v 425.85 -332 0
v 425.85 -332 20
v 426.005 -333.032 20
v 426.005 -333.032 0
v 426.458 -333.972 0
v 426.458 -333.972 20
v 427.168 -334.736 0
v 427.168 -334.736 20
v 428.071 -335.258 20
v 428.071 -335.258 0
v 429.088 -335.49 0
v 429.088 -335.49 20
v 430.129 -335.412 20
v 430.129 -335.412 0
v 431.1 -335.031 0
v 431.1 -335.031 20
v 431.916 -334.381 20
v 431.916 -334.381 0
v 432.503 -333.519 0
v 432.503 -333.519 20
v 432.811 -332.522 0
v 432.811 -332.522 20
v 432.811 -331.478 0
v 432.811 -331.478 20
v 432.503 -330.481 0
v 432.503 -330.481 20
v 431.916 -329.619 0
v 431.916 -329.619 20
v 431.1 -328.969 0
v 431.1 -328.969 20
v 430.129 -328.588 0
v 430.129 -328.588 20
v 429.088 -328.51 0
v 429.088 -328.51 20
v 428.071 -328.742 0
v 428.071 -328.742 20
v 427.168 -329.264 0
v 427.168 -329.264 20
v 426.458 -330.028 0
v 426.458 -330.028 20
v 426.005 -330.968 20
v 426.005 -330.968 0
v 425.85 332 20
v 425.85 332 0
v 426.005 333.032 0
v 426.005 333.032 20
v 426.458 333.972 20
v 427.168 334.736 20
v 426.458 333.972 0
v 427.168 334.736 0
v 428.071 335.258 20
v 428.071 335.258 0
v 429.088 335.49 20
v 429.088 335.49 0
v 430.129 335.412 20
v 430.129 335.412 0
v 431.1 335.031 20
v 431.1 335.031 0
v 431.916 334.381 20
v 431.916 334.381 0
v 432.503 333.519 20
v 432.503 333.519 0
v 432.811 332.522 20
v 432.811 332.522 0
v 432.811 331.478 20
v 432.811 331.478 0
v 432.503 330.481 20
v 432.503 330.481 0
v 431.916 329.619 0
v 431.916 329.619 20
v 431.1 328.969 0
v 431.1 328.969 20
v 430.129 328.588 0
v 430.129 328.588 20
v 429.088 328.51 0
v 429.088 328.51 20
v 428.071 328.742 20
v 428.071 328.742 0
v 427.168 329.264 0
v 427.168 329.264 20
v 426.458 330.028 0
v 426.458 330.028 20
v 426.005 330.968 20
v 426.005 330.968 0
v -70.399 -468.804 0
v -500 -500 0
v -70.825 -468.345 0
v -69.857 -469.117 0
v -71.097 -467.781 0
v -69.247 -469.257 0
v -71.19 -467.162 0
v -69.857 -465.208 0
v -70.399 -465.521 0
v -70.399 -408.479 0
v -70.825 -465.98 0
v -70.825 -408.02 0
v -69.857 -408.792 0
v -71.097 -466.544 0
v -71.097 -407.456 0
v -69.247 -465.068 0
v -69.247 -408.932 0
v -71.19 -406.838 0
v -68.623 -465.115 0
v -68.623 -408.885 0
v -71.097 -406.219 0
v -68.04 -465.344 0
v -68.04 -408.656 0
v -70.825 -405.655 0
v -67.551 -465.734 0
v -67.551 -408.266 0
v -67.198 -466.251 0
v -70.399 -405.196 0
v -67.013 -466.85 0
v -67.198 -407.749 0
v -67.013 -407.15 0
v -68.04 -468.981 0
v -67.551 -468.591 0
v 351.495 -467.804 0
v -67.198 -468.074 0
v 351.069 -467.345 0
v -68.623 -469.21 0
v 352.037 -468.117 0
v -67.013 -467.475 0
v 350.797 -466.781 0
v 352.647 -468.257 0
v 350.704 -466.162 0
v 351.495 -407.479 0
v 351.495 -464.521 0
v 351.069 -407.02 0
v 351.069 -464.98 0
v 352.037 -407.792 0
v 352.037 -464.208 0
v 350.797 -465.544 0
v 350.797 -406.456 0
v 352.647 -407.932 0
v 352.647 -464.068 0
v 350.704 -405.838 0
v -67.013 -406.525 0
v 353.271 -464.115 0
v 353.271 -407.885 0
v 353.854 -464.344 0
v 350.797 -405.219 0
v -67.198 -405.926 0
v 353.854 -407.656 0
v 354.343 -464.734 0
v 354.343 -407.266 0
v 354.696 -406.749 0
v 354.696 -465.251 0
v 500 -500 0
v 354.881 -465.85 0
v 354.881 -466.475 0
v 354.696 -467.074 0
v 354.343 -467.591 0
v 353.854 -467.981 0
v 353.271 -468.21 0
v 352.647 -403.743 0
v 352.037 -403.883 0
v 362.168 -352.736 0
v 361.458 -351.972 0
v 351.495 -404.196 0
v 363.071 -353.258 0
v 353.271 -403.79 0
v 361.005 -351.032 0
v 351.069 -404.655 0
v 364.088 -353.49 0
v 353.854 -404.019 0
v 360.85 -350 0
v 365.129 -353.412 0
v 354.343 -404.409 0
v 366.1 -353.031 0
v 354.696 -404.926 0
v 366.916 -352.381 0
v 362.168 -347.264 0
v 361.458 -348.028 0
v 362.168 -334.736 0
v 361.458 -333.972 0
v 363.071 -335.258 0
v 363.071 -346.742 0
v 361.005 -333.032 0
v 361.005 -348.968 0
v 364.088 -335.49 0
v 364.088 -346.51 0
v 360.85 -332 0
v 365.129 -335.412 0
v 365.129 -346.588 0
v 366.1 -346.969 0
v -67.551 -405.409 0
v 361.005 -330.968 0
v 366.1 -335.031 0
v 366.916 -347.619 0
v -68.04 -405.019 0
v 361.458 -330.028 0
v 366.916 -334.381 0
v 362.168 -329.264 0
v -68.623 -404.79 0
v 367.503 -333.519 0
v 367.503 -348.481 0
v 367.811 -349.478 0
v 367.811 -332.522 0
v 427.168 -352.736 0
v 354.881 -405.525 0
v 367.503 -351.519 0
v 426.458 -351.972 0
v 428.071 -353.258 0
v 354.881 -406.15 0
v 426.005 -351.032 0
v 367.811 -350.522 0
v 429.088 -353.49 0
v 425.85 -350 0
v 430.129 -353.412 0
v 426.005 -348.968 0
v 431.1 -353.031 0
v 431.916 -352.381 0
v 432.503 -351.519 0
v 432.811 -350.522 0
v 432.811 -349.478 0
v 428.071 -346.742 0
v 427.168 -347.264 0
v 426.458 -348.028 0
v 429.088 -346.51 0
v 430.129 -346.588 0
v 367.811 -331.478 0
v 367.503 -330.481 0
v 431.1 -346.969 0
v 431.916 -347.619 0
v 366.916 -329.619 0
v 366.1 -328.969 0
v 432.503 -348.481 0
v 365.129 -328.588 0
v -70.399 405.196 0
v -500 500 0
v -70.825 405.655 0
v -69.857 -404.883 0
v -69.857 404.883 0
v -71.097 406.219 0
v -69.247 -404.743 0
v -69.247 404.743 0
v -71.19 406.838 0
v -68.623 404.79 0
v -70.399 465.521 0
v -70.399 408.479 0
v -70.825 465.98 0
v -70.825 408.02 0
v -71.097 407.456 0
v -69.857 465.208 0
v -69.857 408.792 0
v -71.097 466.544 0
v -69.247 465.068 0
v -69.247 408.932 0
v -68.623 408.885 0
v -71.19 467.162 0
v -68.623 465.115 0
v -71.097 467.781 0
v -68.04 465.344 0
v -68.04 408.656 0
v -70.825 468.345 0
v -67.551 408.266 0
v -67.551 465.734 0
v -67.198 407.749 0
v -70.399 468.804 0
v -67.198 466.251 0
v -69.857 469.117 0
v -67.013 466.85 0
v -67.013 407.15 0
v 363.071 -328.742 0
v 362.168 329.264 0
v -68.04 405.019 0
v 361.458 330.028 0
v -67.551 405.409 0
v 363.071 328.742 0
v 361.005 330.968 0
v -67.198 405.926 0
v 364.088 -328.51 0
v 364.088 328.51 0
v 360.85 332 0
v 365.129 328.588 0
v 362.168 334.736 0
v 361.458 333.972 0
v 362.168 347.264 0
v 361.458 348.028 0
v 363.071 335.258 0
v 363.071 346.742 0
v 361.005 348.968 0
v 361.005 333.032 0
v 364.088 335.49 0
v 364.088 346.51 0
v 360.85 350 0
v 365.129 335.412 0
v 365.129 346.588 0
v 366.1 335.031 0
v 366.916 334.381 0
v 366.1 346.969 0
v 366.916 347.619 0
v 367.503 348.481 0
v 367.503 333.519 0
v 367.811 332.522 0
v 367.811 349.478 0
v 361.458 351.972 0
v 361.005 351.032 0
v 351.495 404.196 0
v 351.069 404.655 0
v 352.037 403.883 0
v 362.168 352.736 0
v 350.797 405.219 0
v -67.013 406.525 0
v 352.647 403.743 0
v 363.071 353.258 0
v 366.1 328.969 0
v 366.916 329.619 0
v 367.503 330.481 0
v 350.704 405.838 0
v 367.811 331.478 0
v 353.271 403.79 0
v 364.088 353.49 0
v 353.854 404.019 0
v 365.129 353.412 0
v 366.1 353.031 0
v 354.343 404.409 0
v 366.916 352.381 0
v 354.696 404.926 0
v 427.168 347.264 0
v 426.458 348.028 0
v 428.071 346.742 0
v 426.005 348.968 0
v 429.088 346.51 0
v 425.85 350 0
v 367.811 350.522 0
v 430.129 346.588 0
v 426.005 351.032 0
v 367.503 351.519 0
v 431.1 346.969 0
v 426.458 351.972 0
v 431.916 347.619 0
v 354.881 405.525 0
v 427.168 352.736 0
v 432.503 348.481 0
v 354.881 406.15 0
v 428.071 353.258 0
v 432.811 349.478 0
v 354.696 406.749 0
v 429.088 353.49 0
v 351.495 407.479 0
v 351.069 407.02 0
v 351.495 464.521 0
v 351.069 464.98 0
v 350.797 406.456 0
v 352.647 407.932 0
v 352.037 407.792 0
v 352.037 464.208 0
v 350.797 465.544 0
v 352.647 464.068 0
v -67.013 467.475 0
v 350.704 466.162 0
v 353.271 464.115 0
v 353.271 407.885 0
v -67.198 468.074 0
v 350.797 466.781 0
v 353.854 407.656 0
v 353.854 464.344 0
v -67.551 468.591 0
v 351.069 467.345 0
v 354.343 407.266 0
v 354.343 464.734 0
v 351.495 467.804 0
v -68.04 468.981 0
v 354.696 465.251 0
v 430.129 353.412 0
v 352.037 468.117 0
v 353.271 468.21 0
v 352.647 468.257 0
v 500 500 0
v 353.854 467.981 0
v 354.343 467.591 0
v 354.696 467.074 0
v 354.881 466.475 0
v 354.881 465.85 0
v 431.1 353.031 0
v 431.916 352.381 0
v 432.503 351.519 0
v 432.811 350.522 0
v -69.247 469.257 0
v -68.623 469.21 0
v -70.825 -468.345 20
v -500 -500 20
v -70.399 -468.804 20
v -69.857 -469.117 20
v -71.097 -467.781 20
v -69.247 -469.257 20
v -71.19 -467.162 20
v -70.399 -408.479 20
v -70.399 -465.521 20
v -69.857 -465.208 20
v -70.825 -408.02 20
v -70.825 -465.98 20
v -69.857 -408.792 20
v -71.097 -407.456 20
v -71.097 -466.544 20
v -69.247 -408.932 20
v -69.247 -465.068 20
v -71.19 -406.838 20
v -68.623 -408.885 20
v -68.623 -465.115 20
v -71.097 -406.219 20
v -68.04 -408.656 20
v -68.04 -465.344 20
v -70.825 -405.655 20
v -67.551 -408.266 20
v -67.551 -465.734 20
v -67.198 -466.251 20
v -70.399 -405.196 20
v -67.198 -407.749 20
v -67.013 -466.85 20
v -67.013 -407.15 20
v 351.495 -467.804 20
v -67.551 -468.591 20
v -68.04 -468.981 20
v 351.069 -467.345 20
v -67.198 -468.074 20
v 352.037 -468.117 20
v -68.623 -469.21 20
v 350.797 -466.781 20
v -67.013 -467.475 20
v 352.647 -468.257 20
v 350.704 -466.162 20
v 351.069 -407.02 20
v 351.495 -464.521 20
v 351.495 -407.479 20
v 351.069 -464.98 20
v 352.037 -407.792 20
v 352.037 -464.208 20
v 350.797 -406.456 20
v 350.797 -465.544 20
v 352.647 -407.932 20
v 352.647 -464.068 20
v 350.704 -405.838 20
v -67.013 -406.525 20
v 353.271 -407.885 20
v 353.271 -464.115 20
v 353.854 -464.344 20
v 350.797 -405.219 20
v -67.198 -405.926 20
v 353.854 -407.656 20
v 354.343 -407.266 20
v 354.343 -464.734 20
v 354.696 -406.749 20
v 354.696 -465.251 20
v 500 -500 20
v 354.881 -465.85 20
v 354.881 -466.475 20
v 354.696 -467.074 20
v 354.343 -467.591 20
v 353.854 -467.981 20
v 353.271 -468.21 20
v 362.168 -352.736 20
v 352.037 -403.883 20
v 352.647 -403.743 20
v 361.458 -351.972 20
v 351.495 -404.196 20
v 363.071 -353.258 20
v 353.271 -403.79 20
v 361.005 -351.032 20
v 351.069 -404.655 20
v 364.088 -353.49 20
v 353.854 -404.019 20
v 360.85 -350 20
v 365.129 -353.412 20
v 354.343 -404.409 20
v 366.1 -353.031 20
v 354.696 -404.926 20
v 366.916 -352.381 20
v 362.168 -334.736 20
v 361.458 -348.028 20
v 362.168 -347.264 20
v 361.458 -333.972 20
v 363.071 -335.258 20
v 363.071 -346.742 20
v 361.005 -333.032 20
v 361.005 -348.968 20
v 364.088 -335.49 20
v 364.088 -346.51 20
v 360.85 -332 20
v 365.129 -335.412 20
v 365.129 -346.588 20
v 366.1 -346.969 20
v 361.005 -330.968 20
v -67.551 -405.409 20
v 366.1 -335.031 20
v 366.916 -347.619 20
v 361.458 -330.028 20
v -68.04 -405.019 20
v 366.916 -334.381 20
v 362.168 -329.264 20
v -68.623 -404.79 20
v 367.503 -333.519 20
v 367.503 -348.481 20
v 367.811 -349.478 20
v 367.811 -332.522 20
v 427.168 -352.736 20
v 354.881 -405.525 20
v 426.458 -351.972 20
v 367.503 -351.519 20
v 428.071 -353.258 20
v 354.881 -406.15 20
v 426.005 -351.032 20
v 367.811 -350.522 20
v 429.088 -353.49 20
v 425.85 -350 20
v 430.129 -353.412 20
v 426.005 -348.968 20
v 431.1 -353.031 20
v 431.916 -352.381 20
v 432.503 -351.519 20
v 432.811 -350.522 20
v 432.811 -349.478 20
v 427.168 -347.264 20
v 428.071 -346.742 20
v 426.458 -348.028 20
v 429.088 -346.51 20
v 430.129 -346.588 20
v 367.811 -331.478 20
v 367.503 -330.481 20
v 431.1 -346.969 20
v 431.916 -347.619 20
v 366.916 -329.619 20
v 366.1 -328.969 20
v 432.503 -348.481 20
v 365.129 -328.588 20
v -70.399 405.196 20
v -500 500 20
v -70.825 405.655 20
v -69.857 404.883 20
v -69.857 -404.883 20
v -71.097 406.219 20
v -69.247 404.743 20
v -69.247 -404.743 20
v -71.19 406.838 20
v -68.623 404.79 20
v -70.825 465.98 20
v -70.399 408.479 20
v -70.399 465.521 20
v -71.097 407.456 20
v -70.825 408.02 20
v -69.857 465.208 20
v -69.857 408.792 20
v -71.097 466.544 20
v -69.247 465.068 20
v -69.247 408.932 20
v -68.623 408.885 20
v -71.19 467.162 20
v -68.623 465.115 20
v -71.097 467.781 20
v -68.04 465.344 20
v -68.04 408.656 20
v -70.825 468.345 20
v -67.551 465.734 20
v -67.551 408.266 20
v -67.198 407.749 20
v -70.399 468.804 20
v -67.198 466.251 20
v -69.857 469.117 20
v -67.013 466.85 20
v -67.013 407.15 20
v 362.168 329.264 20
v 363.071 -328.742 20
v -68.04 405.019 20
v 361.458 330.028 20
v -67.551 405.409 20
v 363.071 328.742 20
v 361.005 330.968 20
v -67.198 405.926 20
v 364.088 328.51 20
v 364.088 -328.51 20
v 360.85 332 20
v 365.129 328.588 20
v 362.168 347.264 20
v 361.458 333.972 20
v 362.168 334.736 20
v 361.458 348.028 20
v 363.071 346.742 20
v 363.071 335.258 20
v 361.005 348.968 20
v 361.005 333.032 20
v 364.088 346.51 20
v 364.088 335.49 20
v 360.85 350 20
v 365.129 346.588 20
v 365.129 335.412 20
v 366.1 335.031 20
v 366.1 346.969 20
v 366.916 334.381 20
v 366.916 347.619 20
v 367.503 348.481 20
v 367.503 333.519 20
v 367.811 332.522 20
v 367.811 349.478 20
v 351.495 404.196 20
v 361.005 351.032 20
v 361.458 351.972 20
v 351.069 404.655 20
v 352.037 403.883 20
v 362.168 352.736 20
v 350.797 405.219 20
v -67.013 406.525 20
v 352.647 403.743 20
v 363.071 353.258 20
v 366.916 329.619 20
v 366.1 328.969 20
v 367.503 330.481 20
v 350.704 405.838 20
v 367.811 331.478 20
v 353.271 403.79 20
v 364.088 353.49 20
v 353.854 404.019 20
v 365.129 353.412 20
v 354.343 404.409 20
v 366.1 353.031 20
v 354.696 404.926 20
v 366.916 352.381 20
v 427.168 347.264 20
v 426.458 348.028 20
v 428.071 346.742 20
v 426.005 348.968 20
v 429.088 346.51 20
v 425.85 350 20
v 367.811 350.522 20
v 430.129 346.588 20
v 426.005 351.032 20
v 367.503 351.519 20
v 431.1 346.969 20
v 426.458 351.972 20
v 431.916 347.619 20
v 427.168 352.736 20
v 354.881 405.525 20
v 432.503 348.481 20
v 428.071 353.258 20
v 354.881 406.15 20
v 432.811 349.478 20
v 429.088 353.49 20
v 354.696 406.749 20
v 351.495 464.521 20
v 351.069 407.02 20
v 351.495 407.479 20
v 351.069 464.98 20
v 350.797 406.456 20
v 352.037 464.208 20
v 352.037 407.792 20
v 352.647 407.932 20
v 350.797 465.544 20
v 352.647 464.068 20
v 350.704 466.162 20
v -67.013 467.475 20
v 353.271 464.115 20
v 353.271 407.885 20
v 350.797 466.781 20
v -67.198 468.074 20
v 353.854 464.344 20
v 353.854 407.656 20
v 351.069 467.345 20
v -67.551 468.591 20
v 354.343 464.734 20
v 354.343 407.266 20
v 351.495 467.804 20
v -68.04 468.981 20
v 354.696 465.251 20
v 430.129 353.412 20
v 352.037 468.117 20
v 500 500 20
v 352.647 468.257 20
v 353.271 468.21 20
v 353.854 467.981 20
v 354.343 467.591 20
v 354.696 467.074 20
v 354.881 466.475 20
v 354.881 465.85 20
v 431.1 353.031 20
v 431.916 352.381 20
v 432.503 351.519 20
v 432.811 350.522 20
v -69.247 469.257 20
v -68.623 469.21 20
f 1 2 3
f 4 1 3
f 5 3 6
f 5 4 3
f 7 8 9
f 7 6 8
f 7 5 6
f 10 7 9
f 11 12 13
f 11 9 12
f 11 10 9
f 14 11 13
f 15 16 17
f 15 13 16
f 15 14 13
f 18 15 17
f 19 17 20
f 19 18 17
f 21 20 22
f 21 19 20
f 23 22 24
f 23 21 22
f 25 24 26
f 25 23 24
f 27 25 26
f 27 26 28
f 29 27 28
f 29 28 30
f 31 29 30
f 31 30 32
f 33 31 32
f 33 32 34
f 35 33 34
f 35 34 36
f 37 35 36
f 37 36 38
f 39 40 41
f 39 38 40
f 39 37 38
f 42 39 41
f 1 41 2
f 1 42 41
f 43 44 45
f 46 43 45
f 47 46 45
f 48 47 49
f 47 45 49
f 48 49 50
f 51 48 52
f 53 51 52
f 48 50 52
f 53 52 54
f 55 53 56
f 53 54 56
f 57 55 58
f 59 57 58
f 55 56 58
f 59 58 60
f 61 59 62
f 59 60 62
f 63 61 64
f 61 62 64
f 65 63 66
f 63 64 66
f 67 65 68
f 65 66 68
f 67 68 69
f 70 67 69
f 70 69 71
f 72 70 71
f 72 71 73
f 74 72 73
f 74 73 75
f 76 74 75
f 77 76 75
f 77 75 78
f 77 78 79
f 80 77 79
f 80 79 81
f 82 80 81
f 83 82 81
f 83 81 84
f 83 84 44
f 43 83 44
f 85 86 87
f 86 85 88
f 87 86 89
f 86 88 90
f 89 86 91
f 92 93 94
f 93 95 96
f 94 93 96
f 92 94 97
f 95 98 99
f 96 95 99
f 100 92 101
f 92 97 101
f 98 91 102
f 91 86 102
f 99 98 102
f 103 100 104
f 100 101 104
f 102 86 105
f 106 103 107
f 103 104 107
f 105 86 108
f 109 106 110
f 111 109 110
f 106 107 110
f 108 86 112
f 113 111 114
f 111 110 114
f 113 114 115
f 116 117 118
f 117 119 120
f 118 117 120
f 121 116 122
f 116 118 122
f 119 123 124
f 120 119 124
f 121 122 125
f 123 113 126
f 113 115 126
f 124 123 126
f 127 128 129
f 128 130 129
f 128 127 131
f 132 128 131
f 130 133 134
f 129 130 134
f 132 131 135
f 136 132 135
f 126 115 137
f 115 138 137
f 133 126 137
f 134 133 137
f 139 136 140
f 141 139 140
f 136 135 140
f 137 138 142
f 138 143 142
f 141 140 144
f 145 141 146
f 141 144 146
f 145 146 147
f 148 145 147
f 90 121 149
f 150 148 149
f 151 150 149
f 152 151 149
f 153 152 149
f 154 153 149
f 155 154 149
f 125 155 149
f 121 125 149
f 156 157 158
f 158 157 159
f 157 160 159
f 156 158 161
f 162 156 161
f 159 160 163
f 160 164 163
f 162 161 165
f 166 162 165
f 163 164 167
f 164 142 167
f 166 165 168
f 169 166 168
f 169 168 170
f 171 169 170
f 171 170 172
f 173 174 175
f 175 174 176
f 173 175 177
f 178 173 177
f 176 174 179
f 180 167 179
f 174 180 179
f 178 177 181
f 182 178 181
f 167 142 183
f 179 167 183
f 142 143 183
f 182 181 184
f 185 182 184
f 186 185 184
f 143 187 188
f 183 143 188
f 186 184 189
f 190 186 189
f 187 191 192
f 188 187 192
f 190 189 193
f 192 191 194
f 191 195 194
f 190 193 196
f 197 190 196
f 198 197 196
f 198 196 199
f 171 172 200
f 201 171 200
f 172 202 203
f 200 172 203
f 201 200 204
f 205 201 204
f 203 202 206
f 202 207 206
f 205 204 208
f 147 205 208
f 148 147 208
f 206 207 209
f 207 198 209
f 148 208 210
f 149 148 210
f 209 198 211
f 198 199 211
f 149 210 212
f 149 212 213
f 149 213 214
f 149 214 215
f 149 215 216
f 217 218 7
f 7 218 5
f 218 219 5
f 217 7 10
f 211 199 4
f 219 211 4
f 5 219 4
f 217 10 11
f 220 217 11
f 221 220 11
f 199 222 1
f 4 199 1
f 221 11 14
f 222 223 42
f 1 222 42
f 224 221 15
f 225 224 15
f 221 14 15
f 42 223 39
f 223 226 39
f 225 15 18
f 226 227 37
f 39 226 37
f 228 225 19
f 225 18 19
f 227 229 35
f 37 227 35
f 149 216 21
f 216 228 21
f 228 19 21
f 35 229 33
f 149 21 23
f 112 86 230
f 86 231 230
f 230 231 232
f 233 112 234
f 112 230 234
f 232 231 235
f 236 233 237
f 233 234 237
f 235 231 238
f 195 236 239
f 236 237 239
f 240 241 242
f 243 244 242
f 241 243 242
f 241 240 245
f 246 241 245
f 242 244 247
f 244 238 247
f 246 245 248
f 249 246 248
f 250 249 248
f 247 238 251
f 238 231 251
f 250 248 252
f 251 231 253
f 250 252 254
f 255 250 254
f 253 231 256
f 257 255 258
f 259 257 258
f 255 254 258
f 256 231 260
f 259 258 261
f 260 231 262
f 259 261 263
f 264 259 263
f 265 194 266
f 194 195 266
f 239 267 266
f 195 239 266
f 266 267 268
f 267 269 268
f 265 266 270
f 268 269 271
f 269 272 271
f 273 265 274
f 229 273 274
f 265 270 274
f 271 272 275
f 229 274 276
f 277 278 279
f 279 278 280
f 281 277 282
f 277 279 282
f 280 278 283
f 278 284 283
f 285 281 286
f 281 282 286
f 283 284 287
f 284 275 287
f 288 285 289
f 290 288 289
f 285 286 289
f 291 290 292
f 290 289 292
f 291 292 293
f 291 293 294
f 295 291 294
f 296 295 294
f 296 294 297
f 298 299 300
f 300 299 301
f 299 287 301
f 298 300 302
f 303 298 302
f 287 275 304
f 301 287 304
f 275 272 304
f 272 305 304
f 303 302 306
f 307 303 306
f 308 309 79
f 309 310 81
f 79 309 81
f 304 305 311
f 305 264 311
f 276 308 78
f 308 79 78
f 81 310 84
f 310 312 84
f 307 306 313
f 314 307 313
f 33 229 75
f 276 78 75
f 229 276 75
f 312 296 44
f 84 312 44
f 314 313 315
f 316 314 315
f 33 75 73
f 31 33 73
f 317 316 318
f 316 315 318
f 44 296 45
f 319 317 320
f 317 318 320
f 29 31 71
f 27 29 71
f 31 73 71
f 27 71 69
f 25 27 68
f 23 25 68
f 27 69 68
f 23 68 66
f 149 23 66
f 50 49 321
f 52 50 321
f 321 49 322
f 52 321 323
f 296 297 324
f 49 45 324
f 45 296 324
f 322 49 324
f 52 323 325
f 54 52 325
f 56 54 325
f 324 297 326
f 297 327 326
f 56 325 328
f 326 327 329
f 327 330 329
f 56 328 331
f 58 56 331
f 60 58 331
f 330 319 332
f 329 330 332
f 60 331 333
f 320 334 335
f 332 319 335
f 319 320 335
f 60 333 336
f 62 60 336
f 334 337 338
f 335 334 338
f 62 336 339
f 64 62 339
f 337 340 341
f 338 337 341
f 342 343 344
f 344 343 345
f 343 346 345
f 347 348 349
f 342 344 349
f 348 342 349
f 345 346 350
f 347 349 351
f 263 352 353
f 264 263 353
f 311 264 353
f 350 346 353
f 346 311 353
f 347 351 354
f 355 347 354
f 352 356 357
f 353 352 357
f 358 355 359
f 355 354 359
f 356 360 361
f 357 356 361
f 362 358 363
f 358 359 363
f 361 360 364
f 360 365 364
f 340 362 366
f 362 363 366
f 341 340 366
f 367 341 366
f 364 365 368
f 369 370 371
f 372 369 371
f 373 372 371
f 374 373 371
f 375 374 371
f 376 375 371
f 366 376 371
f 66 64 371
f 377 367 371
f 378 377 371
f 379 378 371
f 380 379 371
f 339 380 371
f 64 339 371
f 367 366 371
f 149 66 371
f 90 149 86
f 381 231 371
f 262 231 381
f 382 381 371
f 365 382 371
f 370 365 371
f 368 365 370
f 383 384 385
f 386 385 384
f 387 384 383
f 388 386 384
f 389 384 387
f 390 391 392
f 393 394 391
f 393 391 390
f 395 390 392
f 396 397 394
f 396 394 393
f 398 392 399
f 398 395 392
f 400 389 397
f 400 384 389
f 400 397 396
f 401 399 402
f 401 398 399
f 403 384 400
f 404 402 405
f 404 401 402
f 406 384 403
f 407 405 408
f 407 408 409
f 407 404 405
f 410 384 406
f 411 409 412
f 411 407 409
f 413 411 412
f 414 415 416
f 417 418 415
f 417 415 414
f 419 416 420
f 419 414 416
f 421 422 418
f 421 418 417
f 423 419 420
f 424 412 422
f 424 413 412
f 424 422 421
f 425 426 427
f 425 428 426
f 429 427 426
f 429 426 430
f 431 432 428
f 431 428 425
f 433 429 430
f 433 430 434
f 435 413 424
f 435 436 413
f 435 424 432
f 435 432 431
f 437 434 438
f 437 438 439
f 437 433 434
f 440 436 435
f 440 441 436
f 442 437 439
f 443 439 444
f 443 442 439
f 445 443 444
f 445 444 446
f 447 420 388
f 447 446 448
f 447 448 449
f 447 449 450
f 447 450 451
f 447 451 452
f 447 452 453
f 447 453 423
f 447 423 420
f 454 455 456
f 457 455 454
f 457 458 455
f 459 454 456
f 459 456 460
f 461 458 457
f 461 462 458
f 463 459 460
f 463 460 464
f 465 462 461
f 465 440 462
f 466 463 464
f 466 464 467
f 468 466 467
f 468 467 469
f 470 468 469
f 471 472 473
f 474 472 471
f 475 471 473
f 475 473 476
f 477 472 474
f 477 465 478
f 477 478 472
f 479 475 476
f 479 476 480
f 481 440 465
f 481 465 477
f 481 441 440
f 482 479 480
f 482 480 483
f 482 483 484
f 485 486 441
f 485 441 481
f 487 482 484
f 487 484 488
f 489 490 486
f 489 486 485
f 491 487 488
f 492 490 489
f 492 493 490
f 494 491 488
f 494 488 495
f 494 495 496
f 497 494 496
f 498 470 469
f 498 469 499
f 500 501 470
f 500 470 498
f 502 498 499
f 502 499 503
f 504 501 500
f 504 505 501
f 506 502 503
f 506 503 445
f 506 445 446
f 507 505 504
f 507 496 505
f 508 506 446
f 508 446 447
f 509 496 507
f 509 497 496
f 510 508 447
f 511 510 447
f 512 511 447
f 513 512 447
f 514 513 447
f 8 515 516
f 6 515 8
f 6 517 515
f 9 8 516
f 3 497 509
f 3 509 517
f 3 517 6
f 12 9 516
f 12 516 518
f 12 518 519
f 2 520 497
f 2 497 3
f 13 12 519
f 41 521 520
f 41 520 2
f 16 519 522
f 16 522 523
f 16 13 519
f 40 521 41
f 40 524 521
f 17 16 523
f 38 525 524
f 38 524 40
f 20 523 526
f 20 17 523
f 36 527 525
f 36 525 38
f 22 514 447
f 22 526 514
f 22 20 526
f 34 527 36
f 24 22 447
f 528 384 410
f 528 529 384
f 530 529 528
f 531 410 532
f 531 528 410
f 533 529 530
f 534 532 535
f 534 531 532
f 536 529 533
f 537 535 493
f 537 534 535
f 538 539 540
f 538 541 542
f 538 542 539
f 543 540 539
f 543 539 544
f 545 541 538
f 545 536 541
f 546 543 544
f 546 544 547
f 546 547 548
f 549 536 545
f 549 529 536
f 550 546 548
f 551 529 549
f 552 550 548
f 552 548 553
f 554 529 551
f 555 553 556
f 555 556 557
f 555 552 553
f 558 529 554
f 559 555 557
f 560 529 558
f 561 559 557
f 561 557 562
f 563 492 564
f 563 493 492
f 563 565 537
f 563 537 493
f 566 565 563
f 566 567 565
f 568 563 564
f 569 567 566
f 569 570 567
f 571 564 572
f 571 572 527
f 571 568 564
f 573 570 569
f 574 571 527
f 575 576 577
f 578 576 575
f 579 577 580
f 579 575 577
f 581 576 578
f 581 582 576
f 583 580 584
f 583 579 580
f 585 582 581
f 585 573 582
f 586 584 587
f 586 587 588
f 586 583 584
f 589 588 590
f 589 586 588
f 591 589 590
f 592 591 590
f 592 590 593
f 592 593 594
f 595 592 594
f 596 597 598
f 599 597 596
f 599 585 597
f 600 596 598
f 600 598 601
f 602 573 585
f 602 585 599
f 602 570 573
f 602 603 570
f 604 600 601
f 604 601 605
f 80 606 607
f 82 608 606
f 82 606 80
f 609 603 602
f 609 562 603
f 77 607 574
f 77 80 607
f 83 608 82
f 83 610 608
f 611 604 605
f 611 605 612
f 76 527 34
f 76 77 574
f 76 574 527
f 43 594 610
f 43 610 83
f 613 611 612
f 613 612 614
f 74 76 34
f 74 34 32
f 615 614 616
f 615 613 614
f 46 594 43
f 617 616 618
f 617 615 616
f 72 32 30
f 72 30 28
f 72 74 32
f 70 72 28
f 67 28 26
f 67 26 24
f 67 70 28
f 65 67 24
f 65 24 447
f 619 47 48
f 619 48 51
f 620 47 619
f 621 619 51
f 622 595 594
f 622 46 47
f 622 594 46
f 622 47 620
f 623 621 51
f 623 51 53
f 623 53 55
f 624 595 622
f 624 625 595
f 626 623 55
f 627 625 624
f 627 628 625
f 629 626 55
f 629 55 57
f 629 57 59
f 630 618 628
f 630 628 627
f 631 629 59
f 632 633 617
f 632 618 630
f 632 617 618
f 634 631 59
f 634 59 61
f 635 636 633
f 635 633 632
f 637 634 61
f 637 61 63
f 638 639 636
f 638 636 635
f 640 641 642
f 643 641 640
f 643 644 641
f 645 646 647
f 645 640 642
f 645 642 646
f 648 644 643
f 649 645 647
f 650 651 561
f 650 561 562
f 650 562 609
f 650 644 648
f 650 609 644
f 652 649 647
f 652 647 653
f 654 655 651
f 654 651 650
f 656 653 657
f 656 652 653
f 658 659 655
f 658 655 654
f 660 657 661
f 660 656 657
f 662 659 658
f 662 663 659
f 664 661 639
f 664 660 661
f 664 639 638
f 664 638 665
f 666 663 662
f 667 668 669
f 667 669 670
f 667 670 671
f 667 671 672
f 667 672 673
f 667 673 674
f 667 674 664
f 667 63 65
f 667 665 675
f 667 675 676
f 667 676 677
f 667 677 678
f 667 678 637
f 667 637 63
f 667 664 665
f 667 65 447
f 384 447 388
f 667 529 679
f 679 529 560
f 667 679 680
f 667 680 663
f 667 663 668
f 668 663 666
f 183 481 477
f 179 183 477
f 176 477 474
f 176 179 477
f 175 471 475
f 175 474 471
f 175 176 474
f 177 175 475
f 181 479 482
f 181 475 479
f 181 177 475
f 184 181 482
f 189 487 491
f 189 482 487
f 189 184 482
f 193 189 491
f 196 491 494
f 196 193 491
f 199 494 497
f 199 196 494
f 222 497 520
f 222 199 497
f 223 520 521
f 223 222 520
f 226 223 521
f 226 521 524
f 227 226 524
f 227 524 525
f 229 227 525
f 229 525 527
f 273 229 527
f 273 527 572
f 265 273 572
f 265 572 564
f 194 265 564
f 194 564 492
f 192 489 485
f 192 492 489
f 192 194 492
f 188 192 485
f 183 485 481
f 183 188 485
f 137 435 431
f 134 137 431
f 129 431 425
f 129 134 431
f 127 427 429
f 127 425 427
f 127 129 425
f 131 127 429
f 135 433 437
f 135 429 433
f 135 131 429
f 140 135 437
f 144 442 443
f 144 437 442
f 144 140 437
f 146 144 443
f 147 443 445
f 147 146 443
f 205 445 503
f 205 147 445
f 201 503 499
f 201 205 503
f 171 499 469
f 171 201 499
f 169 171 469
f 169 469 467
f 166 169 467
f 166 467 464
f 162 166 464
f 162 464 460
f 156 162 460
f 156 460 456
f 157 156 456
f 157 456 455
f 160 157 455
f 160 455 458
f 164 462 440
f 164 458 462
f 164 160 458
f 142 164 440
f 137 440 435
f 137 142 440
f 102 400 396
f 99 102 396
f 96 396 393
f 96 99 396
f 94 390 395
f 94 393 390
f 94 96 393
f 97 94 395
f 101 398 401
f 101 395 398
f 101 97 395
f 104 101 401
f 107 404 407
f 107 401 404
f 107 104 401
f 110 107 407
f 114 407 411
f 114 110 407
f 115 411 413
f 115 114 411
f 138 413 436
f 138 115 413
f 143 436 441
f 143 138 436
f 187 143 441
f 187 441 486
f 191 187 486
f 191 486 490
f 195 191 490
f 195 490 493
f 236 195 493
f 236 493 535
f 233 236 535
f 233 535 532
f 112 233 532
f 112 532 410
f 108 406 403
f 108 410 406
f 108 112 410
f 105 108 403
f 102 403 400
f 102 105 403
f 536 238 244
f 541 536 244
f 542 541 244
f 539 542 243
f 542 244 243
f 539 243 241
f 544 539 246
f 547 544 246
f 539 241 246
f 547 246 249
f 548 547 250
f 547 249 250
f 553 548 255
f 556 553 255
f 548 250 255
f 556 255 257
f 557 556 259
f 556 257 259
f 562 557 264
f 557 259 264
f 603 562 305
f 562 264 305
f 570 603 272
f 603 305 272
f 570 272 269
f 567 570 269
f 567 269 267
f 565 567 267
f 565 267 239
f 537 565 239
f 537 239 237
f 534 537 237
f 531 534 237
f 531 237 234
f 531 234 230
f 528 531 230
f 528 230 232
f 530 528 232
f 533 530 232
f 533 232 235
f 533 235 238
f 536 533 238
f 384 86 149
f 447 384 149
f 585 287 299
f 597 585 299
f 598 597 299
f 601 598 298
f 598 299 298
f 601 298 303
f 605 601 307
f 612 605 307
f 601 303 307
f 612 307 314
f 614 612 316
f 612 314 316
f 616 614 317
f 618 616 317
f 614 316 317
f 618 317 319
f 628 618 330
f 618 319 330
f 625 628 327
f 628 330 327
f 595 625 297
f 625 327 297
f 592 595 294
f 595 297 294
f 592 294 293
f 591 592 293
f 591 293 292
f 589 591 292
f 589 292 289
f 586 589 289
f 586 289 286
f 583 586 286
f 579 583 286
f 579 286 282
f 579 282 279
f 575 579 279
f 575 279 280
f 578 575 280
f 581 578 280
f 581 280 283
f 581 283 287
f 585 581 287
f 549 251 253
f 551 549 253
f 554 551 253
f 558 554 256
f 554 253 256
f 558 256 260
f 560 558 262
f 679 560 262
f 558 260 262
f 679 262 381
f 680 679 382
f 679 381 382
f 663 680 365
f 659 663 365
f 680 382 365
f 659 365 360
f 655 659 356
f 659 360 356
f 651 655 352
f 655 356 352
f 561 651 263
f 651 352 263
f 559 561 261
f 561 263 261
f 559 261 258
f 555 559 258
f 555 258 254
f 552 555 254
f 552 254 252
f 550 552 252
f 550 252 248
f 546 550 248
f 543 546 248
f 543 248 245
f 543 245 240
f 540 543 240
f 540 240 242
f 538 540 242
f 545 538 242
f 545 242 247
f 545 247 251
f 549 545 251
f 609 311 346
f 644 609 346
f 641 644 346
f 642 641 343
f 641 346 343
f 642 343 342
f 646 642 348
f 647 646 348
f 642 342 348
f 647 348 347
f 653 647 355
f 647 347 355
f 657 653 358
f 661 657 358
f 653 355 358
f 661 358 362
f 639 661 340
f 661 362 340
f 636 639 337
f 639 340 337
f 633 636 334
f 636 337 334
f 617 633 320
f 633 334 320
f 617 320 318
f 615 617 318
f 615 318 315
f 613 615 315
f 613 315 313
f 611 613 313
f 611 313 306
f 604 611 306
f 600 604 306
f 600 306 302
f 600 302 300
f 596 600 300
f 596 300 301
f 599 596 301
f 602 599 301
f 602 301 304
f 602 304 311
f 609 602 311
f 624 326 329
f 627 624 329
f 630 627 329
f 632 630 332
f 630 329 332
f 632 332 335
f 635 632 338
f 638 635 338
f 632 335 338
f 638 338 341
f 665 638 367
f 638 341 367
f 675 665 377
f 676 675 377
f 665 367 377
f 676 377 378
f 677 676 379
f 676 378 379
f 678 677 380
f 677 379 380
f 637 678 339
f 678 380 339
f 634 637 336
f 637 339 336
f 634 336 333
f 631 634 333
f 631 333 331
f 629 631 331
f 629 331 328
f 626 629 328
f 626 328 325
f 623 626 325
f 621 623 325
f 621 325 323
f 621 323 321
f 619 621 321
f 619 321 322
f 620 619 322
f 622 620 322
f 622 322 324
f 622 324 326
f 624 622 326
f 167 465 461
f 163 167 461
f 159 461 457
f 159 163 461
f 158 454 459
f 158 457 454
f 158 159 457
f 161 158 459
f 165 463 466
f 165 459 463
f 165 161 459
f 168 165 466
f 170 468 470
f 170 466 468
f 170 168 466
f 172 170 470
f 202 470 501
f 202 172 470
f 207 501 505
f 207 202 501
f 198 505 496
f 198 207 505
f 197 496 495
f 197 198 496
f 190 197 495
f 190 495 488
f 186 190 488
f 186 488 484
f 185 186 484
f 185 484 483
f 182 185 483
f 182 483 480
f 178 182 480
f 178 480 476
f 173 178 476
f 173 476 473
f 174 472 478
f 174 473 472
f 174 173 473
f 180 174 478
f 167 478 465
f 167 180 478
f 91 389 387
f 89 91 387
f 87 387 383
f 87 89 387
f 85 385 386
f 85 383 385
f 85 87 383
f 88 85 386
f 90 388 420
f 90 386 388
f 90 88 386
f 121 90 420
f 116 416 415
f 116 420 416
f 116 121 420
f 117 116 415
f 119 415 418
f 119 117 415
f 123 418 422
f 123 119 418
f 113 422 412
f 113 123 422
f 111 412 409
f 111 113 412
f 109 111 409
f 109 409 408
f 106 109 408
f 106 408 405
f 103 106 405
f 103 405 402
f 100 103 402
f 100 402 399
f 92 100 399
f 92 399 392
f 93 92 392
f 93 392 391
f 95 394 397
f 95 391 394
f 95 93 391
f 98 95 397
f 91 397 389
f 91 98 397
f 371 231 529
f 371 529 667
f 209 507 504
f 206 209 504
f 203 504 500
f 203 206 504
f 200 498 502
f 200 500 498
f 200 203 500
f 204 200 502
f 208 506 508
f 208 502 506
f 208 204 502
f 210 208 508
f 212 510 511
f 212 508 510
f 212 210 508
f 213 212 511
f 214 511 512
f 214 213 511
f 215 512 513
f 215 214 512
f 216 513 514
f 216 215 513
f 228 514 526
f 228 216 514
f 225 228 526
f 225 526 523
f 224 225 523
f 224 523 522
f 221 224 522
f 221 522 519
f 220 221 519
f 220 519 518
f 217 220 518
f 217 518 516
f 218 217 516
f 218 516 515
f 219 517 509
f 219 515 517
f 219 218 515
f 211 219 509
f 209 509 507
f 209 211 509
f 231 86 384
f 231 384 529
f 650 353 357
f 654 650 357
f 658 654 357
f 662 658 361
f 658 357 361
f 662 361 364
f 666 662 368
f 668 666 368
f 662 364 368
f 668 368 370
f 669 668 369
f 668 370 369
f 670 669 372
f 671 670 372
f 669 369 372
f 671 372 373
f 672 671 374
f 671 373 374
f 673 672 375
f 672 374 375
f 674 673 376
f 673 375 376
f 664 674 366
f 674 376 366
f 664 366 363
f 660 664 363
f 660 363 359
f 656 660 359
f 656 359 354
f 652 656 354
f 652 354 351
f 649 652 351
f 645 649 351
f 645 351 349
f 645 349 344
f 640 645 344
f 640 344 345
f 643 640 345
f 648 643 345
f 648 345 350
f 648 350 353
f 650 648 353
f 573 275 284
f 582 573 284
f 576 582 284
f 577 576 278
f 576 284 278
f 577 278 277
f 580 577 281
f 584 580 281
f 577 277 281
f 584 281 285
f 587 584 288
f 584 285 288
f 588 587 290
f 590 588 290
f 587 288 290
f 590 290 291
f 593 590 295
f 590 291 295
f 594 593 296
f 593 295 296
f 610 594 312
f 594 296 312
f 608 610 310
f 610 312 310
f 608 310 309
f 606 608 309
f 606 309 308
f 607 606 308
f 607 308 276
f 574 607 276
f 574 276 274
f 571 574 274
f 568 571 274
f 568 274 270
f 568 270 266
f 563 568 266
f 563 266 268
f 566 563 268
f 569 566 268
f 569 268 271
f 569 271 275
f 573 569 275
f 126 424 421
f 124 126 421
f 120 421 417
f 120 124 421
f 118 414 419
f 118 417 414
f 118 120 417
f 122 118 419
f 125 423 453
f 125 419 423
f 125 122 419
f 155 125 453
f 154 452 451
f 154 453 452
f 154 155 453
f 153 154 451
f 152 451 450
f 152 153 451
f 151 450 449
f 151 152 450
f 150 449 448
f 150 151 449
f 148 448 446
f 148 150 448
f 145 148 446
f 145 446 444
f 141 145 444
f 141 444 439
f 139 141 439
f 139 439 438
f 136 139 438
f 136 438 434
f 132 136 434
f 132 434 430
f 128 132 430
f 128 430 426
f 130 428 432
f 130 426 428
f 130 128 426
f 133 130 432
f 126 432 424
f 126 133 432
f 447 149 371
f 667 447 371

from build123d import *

# Parameters (mm, degrees)
SKETCH5_W             = 1000
SKETCH5_H             = 1000
BOSS_EXTRUDE1_DEPTH   = 20
M8X1_0_TAPPED_HOLE1_D = 7
M5X0_8_TAPPED_HOLE1_D = 4.2


with BuildPart() as part:
    # Sketch5 → Boss-Extrude1 (new body)
    with BuildSketch(Plane.XY):
        Rectangle(SKETCH5_W, SKETCH5_H)
    extrude(amount=BOSS_EXTRUDE1_DEPTH)

    # M8x1.0 Tapped Hole1 (through all)
    with Locations(Plane(origin=(364.35, 350, 20), x_dir=(1, 0, 0), z_dir=(0, 0, 1))):
        with Locations((0, 0), (0, -18), (65, -18), (65, 0)):
            m8x1_0_tapped_hole1 = Hole(M8X1_0_TAPPED_HOLE1_D / 2)

    # M5x0.8 Tapped Hole1 (through all)
    with Locations(Plane(origin=(-69.09, 406.8375, 20), x_dir=(1, 0, 0), z_dir=(0, 0, 1))):
        with Locations((0, 0), (0, 60.325), (421.894, 59.325), (421.894, -1)):
            m5x0_8_tapped_hole1 = Hole(M5X0_8_TAPPED_HOLE1_D / 2)

    # Mirror1: M8x1.0 Tapped Hole1, M5x0.8 Tapped Hole1 across plane
    add(m8x1_0_tapped_hole1.mirror(Plane.ZX), mode=Mode.SUBTRACT)
    add(m5x0_8_tapped_hole1.mirror(Plane.ZX), mode=Mode.SUBTRACT)


solid = part.part
